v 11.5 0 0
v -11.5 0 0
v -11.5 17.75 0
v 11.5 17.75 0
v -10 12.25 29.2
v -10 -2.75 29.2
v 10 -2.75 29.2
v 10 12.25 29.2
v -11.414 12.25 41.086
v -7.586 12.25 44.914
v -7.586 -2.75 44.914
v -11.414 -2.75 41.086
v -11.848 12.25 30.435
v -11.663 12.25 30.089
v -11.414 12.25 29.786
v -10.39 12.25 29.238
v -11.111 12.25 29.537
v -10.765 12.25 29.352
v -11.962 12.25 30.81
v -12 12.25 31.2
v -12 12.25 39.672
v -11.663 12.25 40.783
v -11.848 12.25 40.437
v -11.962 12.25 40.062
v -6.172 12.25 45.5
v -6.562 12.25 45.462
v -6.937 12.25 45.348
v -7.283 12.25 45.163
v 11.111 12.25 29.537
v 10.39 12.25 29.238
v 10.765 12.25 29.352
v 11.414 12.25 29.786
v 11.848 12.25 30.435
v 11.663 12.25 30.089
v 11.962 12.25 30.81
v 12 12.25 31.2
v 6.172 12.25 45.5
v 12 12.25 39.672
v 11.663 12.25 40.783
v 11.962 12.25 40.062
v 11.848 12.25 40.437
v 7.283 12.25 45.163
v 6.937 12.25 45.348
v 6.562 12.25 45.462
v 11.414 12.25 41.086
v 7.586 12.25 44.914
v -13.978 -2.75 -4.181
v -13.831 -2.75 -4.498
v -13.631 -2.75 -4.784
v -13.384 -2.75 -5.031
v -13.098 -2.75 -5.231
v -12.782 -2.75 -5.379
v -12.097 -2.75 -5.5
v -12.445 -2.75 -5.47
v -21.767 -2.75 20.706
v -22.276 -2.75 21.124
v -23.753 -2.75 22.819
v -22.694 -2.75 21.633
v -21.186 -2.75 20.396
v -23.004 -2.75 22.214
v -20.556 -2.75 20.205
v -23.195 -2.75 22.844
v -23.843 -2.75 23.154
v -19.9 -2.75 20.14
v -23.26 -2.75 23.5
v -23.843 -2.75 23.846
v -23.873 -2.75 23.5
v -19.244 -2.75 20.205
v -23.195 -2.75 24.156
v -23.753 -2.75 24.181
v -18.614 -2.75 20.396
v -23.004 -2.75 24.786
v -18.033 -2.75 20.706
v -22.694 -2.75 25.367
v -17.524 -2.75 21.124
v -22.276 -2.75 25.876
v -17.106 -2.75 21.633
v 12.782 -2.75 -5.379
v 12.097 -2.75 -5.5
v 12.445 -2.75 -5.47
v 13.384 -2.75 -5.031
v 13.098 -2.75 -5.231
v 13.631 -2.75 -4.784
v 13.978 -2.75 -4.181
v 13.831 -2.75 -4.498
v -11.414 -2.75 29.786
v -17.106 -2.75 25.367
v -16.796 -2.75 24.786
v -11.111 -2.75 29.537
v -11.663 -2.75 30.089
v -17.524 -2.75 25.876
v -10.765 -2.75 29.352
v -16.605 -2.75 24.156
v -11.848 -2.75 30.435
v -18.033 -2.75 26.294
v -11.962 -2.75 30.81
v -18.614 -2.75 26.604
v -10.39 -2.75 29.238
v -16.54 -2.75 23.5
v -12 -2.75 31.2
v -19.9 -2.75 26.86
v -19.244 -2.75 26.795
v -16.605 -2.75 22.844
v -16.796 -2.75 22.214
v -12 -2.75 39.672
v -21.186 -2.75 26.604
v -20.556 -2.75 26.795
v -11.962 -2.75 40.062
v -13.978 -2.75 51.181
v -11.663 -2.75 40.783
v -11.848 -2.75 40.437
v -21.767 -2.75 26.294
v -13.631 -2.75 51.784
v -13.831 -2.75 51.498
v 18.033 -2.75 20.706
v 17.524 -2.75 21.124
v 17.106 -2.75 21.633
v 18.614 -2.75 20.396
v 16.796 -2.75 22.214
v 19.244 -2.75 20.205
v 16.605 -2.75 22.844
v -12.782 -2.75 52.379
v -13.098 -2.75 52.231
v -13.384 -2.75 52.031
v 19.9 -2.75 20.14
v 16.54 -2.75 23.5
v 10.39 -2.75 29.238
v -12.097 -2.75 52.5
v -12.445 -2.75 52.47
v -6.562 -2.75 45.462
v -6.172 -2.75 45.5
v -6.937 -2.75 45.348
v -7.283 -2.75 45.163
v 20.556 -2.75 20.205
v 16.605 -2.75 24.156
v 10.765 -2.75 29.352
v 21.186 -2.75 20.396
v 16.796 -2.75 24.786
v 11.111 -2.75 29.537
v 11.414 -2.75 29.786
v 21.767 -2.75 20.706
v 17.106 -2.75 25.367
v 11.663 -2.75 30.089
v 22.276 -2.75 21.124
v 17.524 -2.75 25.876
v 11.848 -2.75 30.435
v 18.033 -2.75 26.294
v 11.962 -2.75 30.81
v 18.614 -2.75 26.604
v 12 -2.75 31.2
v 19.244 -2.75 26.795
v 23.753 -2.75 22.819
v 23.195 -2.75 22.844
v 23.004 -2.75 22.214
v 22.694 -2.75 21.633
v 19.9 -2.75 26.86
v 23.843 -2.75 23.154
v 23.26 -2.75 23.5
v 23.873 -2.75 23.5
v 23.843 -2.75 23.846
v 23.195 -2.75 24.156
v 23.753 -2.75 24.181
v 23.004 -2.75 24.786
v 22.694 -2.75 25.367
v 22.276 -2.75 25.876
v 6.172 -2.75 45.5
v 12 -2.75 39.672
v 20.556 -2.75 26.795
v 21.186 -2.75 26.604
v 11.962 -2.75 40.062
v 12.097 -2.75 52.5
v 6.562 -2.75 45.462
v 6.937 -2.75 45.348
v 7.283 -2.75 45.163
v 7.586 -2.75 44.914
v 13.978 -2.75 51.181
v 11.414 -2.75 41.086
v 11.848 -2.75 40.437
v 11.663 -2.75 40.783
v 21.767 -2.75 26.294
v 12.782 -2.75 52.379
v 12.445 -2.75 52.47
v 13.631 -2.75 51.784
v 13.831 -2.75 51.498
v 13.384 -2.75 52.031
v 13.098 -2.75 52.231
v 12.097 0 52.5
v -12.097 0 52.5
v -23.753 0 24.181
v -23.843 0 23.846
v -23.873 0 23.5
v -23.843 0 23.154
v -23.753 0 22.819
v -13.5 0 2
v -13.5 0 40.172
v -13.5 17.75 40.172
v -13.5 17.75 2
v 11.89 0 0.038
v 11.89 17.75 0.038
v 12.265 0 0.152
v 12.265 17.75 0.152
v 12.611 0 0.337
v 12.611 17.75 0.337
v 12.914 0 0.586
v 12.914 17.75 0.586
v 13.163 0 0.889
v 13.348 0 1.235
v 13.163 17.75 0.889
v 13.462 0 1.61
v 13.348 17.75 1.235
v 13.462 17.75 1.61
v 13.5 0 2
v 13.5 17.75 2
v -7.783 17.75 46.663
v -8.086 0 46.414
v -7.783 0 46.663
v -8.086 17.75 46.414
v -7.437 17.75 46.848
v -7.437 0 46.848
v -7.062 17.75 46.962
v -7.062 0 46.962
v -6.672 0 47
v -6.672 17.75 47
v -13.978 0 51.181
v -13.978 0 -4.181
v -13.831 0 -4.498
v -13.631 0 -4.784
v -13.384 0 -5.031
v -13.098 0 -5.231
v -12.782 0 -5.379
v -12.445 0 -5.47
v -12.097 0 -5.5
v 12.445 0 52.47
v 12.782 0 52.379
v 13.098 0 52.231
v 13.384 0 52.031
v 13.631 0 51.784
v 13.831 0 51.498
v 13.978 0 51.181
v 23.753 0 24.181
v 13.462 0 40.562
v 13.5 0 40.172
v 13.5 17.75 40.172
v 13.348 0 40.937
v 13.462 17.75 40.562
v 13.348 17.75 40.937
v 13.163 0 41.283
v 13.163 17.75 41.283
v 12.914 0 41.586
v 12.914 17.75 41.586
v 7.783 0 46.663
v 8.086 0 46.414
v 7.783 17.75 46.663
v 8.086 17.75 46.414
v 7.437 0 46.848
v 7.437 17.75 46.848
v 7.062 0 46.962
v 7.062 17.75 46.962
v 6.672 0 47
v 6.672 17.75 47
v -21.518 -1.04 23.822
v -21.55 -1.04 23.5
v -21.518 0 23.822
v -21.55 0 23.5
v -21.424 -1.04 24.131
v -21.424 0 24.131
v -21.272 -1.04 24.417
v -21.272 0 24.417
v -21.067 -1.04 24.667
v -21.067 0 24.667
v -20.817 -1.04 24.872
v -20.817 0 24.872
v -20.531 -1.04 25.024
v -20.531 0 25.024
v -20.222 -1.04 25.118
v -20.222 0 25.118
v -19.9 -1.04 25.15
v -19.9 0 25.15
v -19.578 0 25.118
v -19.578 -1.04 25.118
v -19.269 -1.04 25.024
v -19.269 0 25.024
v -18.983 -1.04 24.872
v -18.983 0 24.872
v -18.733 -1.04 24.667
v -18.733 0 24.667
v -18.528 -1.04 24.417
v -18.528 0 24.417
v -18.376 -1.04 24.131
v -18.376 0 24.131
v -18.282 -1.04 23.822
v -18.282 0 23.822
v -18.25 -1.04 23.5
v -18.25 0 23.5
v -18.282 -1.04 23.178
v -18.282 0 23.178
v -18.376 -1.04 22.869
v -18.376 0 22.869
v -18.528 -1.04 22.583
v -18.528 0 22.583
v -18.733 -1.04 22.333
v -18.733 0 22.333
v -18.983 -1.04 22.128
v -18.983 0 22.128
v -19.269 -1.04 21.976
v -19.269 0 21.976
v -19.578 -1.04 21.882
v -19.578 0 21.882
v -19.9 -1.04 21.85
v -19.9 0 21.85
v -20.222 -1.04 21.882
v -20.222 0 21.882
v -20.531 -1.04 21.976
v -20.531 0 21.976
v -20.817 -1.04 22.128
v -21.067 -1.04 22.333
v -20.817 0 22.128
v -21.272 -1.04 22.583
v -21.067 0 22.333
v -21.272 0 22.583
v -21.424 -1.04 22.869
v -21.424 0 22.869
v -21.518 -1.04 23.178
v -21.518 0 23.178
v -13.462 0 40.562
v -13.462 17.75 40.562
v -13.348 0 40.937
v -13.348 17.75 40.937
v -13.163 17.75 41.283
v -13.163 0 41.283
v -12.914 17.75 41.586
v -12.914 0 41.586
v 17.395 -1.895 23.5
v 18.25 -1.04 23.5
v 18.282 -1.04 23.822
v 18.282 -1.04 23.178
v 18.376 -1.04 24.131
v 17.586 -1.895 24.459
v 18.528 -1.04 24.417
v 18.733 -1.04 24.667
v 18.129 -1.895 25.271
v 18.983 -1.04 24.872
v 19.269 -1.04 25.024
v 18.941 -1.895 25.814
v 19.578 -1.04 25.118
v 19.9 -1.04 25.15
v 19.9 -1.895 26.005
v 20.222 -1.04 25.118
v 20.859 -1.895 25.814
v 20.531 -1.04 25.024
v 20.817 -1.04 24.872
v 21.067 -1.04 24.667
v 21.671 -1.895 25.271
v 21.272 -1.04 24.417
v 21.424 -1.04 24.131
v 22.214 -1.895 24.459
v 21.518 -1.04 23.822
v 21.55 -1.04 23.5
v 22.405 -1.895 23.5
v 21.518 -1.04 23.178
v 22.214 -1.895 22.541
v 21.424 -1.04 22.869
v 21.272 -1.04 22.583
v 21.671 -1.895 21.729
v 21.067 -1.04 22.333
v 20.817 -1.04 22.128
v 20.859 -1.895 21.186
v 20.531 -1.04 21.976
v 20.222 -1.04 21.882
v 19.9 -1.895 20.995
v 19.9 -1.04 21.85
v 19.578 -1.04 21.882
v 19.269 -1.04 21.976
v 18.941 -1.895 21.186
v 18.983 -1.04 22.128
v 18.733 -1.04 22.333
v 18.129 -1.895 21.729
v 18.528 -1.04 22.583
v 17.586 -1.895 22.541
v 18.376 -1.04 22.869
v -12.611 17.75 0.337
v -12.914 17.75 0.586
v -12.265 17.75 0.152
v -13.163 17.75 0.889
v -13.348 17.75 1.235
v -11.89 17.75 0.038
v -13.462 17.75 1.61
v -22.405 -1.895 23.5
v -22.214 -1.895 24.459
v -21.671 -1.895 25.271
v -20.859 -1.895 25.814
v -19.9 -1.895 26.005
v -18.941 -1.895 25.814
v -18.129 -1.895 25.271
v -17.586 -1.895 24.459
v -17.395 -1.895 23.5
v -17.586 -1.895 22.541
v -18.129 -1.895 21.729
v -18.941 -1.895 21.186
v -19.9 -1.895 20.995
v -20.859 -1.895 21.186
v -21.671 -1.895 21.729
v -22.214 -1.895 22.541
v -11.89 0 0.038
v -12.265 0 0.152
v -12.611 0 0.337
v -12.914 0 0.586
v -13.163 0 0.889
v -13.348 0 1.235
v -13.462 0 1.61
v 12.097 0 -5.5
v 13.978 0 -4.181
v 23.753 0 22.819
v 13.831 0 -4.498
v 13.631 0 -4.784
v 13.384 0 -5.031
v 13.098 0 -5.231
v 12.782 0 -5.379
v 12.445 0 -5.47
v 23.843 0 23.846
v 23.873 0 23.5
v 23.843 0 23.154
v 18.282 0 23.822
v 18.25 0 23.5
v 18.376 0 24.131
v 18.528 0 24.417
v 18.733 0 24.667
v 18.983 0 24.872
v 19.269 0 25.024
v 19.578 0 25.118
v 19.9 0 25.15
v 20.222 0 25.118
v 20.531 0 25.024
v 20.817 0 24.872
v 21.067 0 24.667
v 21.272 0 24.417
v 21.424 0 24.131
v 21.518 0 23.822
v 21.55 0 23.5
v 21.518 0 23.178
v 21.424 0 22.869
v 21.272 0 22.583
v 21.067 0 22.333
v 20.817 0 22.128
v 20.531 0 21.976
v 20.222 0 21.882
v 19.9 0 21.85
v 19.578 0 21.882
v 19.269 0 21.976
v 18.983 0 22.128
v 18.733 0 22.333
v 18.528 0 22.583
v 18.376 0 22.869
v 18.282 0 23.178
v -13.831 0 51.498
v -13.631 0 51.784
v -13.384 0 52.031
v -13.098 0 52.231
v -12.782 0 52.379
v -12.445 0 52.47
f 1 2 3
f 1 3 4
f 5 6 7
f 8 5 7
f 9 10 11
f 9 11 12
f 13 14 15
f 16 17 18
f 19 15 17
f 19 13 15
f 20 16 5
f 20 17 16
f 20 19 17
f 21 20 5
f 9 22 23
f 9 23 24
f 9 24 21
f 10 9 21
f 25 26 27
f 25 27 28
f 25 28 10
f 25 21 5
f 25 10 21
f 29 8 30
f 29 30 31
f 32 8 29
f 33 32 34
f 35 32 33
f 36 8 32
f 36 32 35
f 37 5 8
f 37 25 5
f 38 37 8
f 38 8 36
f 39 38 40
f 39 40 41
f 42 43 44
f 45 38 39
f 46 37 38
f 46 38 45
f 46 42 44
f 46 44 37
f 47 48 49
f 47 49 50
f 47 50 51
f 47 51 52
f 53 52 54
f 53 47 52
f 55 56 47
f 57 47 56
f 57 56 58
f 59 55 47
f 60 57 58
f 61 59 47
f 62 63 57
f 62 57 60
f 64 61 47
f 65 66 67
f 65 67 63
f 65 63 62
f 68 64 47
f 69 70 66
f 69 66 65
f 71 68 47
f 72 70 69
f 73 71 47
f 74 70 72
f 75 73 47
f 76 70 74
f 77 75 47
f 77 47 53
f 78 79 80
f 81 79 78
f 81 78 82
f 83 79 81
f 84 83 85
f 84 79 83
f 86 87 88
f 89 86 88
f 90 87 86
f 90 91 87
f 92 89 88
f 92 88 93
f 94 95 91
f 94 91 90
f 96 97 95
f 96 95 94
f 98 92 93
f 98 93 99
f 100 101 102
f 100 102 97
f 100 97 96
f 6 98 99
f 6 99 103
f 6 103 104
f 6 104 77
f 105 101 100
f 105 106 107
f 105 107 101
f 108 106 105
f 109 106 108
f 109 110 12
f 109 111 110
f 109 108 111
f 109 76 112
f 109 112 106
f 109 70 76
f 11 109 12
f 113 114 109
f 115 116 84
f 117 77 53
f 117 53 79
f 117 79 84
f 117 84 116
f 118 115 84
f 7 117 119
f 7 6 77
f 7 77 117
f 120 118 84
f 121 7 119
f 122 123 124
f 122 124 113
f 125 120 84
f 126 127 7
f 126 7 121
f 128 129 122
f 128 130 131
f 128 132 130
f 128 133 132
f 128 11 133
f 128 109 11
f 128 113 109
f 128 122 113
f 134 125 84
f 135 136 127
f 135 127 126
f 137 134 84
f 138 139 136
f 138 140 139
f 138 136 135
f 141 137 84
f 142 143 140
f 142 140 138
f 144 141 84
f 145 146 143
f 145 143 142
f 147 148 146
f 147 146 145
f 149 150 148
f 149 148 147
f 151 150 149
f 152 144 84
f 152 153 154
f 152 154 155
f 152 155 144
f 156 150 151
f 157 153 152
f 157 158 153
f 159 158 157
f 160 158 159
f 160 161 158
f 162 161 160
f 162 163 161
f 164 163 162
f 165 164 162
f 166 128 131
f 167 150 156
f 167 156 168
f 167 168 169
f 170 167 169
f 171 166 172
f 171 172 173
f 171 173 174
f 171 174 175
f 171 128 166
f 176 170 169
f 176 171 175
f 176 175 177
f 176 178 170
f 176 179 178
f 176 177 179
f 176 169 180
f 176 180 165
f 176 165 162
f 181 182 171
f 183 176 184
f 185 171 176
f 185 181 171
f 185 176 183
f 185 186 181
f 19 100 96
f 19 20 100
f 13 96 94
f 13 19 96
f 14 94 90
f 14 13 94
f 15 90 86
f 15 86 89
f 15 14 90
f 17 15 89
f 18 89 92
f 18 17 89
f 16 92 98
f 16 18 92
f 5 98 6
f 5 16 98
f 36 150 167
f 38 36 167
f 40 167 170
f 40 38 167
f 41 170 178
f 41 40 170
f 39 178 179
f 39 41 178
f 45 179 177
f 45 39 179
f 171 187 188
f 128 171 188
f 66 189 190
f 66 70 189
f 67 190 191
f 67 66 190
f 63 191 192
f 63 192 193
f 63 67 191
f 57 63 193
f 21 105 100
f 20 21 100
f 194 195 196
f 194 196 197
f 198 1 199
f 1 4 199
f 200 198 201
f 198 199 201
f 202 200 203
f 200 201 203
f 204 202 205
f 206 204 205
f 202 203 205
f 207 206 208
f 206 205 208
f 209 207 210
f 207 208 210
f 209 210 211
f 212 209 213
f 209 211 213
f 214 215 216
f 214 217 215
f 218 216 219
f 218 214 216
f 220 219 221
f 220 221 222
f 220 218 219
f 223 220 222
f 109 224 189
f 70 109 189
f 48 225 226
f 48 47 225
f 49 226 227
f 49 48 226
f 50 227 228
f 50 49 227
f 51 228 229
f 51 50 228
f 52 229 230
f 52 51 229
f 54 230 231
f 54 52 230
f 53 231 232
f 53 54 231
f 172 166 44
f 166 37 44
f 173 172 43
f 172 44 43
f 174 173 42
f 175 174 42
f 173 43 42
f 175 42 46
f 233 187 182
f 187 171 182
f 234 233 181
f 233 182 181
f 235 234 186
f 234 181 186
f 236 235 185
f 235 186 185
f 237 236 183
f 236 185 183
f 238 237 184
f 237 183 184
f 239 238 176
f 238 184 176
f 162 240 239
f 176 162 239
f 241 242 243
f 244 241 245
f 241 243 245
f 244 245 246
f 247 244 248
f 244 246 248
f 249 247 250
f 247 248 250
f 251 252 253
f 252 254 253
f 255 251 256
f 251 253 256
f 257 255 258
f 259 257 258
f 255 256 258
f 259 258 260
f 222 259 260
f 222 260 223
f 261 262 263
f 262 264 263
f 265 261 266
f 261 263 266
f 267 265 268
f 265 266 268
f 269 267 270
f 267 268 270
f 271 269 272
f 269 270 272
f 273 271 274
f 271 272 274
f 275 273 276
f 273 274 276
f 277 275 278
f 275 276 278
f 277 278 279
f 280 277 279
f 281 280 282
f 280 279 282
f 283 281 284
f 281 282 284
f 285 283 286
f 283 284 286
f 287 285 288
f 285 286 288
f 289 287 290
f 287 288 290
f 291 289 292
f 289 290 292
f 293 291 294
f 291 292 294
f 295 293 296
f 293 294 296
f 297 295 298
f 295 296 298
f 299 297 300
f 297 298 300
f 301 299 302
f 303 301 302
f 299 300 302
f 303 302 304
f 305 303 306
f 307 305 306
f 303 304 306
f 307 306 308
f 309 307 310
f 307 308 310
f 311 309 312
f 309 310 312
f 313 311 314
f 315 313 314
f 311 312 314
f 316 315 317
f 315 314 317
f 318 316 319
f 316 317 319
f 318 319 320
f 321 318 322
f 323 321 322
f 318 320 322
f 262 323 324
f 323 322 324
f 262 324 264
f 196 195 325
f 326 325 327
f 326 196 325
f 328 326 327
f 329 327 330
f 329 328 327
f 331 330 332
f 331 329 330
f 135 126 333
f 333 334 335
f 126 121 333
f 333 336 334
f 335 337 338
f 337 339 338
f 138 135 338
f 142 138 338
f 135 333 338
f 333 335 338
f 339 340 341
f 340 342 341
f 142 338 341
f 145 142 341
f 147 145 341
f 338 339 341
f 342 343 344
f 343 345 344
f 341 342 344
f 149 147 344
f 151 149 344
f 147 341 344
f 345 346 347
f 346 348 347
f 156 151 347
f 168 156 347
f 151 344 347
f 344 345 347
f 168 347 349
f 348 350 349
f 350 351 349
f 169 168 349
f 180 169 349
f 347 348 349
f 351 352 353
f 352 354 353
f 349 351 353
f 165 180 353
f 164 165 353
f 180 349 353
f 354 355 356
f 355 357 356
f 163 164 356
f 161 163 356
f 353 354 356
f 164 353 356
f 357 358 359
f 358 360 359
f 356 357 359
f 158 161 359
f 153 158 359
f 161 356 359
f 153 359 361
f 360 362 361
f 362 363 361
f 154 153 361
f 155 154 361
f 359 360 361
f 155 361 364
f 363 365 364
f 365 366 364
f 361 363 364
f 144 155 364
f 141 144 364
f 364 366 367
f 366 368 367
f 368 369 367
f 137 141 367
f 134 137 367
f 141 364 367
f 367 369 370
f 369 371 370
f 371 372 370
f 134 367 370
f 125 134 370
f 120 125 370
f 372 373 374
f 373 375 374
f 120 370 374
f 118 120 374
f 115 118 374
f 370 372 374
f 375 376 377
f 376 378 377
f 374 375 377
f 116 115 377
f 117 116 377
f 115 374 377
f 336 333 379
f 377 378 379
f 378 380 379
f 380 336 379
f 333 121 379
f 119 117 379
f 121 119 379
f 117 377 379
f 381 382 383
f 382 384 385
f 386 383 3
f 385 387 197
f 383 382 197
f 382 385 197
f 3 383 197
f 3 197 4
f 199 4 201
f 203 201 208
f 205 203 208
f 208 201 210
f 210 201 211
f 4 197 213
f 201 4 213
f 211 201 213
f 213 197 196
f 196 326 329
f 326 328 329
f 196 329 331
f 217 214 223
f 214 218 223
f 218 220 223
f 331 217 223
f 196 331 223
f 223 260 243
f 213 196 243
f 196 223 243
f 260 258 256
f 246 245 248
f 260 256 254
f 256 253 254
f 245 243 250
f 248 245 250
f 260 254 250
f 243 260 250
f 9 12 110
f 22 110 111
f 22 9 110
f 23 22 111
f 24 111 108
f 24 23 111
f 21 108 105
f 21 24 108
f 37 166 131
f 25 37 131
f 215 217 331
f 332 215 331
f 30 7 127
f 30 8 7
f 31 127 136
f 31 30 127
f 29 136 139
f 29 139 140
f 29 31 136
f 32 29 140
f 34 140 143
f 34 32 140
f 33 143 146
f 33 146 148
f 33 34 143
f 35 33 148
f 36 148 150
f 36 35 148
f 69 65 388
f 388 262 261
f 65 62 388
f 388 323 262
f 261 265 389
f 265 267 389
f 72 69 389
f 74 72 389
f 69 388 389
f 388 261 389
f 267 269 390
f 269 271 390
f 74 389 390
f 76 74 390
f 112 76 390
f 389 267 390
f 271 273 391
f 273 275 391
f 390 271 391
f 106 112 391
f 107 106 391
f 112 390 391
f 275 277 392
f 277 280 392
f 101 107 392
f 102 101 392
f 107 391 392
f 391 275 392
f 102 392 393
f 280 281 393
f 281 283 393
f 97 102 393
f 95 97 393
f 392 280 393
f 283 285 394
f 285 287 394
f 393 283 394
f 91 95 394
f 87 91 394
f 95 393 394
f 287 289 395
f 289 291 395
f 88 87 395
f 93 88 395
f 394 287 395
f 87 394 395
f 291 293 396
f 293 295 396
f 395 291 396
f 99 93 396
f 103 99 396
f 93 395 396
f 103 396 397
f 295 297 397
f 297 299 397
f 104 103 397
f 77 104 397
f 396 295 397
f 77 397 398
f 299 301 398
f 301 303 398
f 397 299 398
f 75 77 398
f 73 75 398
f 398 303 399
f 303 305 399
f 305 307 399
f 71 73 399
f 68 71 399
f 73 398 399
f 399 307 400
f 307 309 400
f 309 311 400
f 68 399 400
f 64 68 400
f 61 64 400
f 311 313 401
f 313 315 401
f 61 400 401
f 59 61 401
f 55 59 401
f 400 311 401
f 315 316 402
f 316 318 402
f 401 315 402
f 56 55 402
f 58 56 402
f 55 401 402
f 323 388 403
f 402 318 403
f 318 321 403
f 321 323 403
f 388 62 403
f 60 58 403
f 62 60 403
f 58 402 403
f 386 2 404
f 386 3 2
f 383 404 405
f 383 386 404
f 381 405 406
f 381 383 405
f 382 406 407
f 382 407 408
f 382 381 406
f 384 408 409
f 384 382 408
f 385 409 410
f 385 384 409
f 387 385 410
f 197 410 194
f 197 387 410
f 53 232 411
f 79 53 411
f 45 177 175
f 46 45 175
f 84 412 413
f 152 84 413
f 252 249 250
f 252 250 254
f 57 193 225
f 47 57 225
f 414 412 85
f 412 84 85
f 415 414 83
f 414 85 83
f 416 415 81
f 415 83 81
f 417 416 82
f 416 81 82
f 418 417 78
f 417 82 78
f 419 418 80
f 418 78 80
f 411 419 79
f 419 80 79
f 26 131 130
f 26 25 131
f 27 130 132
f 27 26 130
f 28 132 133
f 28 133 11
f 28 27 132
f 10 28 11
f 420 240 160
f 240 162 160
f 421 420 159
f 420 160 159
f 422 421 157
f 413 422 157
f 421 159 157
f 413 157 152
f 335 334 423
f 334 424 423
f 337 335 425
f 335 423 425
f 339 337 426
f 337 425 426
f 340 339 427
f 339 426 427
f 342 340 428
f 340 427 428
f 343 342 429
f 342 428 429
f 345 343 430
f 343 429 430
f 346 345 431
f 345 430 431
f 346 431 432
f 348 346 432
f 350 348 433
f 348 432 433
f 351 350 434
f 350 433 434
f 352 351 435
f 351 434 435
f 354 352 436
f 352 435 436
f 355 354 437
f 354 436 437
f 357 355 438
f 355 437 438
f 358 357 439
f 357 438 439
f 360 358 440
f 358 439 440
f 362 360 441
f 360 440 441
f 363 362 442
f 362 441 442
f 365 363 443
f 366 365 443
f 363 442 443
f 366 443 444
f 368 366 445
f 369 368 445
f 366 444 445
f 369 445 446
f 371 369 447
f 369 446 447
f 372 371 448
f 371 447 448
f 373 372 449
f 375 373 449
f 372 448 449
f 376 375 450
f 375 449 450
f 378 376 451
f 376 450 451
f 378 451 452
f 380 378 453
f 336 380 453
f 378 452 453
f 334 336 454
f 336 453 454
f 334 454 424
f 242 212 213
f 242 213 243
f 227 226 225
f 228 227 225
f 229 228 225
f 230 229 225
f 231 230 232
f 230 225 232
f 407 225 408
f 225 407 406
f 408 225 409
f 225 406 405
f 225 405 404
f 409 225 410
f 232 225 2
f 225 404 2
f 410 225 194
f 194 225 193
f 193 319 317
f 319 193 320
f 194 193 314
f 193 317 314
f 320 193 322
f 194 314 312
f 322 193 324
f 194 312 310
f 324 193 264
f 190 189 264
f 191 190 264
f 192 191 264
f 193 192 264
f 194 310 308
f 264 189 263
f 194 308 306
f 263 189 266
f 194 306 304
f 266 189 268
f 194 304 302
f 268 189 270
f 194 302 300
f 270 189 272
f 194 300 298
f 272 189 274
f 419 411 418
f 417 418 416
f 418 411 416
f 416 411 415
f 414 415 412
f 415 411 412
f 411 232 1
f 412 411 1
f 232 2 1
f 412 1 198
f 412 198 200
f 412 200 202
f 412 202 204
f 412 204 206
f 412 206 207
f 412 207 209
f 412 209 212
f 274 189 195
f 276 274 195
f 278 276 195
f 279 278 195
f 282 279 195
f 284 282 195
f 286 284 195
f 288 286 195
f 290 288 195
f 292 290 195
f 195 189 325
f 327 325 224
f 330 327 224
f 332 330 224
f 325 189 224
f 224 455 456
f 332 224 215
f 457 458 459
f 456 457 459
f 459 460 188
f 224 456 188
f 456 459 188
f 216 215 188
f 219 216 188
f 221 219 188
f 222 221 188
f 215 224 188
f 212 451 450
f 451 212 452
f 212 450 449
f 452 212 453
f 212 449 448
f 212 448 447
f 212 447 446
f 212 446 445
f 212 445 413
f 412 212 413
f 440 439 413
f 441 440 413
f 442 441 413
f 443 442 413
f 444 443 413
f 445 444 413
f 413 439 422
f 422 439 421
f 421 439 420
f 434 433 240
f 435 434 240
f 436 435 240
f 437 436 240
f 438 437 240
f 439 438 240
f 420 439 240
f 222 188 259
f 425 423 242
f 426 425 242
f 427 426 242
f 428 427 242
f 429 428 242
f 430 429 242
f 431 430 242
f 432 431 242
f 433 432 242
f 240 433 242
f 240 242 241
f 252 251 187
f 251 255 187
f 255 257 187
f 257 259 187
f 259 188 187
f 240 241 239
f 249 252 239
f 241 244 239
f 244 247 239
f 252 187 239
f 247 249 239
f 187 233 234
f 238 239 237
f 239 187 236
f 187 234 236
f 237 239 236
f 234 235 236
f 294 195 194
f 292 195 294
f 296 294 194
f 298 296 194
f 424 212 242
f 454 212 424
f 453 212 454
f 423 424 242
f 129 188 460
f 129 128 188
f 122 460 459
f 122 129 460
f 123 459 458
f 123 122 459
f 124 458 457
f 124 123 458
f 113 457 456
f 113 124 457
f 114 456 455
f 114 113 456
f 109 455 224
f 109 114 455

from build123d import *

# Parameters (mm, degrees)
F1_DEPTH       = 2.75
F2_DEPTH       = 17.75
F4_D           = 3.3
F4_CSINK_D     = 6.72
F4_CSINK_ANGLE = 90
F6_DEPTH       = 15
F7_R           = 2


with BuildPart() as f1:
    # F0 (on Front) → F1 (new body)
    with BuildSketch(Plane.XZ):
        Polygon((13.5, 52.5), (0, 52.5), (-13.5, 52.5), (-24, 23.5), (-13.5, -5.5), (0, -5.5), (13.5, -5.5), (24, 23.5), align=None)
        Polygon((13.5, 0), (0, 0), (-13.5, 0), (-13.5, 41), (-7.5, 47), (0, 47), (7.5, 47), (13.5, 41), align=None, mode=Mode.SUBTRACT)
        Polygon((-13.5, 0), (0, 0), (13.5, 0), (13.5, 41), (7.5, 47), (0, 47), (-7.5, 47), (-13.5, 41), align=None)
    extrude(amount=F1_DEPTH)

    # F0 (on Front) → F2 (join)
    with BuildSketch(Plane.XZ):
        Polygon((-13.5, 0), (0, 0), (13.5, 0), (13.5, 41), (7.5, 47), (0, 47), (-7.5, 47), (-13.5, 41), align=None)
    extrude(amount=-F2_DEPTH)

    # F4 (through all)
    with Locations(Plane.XZ.offset(2.75)):
        with Locations((-19.9, 23.5), (19.9, 23.5)):
            CounterSinkHole(F4_D / 2, F4_CSINK_D / 2, counter_sink_angle=F4_CSINK_ANGLE)

    # F5 (on face) → F6 (cut)
    with BuildSketch(Plane.XZ.offset(2.75)):
        Polygon((7, 45.5), (0, 45.5), (-7, 45.5), (-12, 40.5), (-12, 29.2), (0, 29.2), (12, 29.2), (12, 40.5), align=None)
    extrude(amount=-F6_DEPTH, mode=Mode.SUBTRACT)

    # F7
    f7_edges = [f1.edges().sort_by_distance(p)[0] for p in [
        (13.5, -1.375, 52.5),
        (-13.5, -1.375, 52.5),
        (-7.5, 8.875, 47),
        (-13.5, 8.875, 41),
        (7.5, 8.875, 47),
        (13.5, 8.875, 41),
        (-24, -1.375, 23.5),
        (-13.5, -1.375, -5.5),
        (13.5, -1.375, -5.5),
        (24, -1.375, 23.5),
        (13.5, 8.875, 0),
        (-13.5, 8.875, 0),
        (-12, 4.75, 29.2),
        (12, 4.75, 29.2),
        (12, 4.75, 40.5),
        (7, 4.75, 45.5),
        (-12, 4.75, 40.5),
        (-7, 4.75, 45.5),
    ]]
    fillet(f7_edges, radius=F7_R)


solid = f1.part
